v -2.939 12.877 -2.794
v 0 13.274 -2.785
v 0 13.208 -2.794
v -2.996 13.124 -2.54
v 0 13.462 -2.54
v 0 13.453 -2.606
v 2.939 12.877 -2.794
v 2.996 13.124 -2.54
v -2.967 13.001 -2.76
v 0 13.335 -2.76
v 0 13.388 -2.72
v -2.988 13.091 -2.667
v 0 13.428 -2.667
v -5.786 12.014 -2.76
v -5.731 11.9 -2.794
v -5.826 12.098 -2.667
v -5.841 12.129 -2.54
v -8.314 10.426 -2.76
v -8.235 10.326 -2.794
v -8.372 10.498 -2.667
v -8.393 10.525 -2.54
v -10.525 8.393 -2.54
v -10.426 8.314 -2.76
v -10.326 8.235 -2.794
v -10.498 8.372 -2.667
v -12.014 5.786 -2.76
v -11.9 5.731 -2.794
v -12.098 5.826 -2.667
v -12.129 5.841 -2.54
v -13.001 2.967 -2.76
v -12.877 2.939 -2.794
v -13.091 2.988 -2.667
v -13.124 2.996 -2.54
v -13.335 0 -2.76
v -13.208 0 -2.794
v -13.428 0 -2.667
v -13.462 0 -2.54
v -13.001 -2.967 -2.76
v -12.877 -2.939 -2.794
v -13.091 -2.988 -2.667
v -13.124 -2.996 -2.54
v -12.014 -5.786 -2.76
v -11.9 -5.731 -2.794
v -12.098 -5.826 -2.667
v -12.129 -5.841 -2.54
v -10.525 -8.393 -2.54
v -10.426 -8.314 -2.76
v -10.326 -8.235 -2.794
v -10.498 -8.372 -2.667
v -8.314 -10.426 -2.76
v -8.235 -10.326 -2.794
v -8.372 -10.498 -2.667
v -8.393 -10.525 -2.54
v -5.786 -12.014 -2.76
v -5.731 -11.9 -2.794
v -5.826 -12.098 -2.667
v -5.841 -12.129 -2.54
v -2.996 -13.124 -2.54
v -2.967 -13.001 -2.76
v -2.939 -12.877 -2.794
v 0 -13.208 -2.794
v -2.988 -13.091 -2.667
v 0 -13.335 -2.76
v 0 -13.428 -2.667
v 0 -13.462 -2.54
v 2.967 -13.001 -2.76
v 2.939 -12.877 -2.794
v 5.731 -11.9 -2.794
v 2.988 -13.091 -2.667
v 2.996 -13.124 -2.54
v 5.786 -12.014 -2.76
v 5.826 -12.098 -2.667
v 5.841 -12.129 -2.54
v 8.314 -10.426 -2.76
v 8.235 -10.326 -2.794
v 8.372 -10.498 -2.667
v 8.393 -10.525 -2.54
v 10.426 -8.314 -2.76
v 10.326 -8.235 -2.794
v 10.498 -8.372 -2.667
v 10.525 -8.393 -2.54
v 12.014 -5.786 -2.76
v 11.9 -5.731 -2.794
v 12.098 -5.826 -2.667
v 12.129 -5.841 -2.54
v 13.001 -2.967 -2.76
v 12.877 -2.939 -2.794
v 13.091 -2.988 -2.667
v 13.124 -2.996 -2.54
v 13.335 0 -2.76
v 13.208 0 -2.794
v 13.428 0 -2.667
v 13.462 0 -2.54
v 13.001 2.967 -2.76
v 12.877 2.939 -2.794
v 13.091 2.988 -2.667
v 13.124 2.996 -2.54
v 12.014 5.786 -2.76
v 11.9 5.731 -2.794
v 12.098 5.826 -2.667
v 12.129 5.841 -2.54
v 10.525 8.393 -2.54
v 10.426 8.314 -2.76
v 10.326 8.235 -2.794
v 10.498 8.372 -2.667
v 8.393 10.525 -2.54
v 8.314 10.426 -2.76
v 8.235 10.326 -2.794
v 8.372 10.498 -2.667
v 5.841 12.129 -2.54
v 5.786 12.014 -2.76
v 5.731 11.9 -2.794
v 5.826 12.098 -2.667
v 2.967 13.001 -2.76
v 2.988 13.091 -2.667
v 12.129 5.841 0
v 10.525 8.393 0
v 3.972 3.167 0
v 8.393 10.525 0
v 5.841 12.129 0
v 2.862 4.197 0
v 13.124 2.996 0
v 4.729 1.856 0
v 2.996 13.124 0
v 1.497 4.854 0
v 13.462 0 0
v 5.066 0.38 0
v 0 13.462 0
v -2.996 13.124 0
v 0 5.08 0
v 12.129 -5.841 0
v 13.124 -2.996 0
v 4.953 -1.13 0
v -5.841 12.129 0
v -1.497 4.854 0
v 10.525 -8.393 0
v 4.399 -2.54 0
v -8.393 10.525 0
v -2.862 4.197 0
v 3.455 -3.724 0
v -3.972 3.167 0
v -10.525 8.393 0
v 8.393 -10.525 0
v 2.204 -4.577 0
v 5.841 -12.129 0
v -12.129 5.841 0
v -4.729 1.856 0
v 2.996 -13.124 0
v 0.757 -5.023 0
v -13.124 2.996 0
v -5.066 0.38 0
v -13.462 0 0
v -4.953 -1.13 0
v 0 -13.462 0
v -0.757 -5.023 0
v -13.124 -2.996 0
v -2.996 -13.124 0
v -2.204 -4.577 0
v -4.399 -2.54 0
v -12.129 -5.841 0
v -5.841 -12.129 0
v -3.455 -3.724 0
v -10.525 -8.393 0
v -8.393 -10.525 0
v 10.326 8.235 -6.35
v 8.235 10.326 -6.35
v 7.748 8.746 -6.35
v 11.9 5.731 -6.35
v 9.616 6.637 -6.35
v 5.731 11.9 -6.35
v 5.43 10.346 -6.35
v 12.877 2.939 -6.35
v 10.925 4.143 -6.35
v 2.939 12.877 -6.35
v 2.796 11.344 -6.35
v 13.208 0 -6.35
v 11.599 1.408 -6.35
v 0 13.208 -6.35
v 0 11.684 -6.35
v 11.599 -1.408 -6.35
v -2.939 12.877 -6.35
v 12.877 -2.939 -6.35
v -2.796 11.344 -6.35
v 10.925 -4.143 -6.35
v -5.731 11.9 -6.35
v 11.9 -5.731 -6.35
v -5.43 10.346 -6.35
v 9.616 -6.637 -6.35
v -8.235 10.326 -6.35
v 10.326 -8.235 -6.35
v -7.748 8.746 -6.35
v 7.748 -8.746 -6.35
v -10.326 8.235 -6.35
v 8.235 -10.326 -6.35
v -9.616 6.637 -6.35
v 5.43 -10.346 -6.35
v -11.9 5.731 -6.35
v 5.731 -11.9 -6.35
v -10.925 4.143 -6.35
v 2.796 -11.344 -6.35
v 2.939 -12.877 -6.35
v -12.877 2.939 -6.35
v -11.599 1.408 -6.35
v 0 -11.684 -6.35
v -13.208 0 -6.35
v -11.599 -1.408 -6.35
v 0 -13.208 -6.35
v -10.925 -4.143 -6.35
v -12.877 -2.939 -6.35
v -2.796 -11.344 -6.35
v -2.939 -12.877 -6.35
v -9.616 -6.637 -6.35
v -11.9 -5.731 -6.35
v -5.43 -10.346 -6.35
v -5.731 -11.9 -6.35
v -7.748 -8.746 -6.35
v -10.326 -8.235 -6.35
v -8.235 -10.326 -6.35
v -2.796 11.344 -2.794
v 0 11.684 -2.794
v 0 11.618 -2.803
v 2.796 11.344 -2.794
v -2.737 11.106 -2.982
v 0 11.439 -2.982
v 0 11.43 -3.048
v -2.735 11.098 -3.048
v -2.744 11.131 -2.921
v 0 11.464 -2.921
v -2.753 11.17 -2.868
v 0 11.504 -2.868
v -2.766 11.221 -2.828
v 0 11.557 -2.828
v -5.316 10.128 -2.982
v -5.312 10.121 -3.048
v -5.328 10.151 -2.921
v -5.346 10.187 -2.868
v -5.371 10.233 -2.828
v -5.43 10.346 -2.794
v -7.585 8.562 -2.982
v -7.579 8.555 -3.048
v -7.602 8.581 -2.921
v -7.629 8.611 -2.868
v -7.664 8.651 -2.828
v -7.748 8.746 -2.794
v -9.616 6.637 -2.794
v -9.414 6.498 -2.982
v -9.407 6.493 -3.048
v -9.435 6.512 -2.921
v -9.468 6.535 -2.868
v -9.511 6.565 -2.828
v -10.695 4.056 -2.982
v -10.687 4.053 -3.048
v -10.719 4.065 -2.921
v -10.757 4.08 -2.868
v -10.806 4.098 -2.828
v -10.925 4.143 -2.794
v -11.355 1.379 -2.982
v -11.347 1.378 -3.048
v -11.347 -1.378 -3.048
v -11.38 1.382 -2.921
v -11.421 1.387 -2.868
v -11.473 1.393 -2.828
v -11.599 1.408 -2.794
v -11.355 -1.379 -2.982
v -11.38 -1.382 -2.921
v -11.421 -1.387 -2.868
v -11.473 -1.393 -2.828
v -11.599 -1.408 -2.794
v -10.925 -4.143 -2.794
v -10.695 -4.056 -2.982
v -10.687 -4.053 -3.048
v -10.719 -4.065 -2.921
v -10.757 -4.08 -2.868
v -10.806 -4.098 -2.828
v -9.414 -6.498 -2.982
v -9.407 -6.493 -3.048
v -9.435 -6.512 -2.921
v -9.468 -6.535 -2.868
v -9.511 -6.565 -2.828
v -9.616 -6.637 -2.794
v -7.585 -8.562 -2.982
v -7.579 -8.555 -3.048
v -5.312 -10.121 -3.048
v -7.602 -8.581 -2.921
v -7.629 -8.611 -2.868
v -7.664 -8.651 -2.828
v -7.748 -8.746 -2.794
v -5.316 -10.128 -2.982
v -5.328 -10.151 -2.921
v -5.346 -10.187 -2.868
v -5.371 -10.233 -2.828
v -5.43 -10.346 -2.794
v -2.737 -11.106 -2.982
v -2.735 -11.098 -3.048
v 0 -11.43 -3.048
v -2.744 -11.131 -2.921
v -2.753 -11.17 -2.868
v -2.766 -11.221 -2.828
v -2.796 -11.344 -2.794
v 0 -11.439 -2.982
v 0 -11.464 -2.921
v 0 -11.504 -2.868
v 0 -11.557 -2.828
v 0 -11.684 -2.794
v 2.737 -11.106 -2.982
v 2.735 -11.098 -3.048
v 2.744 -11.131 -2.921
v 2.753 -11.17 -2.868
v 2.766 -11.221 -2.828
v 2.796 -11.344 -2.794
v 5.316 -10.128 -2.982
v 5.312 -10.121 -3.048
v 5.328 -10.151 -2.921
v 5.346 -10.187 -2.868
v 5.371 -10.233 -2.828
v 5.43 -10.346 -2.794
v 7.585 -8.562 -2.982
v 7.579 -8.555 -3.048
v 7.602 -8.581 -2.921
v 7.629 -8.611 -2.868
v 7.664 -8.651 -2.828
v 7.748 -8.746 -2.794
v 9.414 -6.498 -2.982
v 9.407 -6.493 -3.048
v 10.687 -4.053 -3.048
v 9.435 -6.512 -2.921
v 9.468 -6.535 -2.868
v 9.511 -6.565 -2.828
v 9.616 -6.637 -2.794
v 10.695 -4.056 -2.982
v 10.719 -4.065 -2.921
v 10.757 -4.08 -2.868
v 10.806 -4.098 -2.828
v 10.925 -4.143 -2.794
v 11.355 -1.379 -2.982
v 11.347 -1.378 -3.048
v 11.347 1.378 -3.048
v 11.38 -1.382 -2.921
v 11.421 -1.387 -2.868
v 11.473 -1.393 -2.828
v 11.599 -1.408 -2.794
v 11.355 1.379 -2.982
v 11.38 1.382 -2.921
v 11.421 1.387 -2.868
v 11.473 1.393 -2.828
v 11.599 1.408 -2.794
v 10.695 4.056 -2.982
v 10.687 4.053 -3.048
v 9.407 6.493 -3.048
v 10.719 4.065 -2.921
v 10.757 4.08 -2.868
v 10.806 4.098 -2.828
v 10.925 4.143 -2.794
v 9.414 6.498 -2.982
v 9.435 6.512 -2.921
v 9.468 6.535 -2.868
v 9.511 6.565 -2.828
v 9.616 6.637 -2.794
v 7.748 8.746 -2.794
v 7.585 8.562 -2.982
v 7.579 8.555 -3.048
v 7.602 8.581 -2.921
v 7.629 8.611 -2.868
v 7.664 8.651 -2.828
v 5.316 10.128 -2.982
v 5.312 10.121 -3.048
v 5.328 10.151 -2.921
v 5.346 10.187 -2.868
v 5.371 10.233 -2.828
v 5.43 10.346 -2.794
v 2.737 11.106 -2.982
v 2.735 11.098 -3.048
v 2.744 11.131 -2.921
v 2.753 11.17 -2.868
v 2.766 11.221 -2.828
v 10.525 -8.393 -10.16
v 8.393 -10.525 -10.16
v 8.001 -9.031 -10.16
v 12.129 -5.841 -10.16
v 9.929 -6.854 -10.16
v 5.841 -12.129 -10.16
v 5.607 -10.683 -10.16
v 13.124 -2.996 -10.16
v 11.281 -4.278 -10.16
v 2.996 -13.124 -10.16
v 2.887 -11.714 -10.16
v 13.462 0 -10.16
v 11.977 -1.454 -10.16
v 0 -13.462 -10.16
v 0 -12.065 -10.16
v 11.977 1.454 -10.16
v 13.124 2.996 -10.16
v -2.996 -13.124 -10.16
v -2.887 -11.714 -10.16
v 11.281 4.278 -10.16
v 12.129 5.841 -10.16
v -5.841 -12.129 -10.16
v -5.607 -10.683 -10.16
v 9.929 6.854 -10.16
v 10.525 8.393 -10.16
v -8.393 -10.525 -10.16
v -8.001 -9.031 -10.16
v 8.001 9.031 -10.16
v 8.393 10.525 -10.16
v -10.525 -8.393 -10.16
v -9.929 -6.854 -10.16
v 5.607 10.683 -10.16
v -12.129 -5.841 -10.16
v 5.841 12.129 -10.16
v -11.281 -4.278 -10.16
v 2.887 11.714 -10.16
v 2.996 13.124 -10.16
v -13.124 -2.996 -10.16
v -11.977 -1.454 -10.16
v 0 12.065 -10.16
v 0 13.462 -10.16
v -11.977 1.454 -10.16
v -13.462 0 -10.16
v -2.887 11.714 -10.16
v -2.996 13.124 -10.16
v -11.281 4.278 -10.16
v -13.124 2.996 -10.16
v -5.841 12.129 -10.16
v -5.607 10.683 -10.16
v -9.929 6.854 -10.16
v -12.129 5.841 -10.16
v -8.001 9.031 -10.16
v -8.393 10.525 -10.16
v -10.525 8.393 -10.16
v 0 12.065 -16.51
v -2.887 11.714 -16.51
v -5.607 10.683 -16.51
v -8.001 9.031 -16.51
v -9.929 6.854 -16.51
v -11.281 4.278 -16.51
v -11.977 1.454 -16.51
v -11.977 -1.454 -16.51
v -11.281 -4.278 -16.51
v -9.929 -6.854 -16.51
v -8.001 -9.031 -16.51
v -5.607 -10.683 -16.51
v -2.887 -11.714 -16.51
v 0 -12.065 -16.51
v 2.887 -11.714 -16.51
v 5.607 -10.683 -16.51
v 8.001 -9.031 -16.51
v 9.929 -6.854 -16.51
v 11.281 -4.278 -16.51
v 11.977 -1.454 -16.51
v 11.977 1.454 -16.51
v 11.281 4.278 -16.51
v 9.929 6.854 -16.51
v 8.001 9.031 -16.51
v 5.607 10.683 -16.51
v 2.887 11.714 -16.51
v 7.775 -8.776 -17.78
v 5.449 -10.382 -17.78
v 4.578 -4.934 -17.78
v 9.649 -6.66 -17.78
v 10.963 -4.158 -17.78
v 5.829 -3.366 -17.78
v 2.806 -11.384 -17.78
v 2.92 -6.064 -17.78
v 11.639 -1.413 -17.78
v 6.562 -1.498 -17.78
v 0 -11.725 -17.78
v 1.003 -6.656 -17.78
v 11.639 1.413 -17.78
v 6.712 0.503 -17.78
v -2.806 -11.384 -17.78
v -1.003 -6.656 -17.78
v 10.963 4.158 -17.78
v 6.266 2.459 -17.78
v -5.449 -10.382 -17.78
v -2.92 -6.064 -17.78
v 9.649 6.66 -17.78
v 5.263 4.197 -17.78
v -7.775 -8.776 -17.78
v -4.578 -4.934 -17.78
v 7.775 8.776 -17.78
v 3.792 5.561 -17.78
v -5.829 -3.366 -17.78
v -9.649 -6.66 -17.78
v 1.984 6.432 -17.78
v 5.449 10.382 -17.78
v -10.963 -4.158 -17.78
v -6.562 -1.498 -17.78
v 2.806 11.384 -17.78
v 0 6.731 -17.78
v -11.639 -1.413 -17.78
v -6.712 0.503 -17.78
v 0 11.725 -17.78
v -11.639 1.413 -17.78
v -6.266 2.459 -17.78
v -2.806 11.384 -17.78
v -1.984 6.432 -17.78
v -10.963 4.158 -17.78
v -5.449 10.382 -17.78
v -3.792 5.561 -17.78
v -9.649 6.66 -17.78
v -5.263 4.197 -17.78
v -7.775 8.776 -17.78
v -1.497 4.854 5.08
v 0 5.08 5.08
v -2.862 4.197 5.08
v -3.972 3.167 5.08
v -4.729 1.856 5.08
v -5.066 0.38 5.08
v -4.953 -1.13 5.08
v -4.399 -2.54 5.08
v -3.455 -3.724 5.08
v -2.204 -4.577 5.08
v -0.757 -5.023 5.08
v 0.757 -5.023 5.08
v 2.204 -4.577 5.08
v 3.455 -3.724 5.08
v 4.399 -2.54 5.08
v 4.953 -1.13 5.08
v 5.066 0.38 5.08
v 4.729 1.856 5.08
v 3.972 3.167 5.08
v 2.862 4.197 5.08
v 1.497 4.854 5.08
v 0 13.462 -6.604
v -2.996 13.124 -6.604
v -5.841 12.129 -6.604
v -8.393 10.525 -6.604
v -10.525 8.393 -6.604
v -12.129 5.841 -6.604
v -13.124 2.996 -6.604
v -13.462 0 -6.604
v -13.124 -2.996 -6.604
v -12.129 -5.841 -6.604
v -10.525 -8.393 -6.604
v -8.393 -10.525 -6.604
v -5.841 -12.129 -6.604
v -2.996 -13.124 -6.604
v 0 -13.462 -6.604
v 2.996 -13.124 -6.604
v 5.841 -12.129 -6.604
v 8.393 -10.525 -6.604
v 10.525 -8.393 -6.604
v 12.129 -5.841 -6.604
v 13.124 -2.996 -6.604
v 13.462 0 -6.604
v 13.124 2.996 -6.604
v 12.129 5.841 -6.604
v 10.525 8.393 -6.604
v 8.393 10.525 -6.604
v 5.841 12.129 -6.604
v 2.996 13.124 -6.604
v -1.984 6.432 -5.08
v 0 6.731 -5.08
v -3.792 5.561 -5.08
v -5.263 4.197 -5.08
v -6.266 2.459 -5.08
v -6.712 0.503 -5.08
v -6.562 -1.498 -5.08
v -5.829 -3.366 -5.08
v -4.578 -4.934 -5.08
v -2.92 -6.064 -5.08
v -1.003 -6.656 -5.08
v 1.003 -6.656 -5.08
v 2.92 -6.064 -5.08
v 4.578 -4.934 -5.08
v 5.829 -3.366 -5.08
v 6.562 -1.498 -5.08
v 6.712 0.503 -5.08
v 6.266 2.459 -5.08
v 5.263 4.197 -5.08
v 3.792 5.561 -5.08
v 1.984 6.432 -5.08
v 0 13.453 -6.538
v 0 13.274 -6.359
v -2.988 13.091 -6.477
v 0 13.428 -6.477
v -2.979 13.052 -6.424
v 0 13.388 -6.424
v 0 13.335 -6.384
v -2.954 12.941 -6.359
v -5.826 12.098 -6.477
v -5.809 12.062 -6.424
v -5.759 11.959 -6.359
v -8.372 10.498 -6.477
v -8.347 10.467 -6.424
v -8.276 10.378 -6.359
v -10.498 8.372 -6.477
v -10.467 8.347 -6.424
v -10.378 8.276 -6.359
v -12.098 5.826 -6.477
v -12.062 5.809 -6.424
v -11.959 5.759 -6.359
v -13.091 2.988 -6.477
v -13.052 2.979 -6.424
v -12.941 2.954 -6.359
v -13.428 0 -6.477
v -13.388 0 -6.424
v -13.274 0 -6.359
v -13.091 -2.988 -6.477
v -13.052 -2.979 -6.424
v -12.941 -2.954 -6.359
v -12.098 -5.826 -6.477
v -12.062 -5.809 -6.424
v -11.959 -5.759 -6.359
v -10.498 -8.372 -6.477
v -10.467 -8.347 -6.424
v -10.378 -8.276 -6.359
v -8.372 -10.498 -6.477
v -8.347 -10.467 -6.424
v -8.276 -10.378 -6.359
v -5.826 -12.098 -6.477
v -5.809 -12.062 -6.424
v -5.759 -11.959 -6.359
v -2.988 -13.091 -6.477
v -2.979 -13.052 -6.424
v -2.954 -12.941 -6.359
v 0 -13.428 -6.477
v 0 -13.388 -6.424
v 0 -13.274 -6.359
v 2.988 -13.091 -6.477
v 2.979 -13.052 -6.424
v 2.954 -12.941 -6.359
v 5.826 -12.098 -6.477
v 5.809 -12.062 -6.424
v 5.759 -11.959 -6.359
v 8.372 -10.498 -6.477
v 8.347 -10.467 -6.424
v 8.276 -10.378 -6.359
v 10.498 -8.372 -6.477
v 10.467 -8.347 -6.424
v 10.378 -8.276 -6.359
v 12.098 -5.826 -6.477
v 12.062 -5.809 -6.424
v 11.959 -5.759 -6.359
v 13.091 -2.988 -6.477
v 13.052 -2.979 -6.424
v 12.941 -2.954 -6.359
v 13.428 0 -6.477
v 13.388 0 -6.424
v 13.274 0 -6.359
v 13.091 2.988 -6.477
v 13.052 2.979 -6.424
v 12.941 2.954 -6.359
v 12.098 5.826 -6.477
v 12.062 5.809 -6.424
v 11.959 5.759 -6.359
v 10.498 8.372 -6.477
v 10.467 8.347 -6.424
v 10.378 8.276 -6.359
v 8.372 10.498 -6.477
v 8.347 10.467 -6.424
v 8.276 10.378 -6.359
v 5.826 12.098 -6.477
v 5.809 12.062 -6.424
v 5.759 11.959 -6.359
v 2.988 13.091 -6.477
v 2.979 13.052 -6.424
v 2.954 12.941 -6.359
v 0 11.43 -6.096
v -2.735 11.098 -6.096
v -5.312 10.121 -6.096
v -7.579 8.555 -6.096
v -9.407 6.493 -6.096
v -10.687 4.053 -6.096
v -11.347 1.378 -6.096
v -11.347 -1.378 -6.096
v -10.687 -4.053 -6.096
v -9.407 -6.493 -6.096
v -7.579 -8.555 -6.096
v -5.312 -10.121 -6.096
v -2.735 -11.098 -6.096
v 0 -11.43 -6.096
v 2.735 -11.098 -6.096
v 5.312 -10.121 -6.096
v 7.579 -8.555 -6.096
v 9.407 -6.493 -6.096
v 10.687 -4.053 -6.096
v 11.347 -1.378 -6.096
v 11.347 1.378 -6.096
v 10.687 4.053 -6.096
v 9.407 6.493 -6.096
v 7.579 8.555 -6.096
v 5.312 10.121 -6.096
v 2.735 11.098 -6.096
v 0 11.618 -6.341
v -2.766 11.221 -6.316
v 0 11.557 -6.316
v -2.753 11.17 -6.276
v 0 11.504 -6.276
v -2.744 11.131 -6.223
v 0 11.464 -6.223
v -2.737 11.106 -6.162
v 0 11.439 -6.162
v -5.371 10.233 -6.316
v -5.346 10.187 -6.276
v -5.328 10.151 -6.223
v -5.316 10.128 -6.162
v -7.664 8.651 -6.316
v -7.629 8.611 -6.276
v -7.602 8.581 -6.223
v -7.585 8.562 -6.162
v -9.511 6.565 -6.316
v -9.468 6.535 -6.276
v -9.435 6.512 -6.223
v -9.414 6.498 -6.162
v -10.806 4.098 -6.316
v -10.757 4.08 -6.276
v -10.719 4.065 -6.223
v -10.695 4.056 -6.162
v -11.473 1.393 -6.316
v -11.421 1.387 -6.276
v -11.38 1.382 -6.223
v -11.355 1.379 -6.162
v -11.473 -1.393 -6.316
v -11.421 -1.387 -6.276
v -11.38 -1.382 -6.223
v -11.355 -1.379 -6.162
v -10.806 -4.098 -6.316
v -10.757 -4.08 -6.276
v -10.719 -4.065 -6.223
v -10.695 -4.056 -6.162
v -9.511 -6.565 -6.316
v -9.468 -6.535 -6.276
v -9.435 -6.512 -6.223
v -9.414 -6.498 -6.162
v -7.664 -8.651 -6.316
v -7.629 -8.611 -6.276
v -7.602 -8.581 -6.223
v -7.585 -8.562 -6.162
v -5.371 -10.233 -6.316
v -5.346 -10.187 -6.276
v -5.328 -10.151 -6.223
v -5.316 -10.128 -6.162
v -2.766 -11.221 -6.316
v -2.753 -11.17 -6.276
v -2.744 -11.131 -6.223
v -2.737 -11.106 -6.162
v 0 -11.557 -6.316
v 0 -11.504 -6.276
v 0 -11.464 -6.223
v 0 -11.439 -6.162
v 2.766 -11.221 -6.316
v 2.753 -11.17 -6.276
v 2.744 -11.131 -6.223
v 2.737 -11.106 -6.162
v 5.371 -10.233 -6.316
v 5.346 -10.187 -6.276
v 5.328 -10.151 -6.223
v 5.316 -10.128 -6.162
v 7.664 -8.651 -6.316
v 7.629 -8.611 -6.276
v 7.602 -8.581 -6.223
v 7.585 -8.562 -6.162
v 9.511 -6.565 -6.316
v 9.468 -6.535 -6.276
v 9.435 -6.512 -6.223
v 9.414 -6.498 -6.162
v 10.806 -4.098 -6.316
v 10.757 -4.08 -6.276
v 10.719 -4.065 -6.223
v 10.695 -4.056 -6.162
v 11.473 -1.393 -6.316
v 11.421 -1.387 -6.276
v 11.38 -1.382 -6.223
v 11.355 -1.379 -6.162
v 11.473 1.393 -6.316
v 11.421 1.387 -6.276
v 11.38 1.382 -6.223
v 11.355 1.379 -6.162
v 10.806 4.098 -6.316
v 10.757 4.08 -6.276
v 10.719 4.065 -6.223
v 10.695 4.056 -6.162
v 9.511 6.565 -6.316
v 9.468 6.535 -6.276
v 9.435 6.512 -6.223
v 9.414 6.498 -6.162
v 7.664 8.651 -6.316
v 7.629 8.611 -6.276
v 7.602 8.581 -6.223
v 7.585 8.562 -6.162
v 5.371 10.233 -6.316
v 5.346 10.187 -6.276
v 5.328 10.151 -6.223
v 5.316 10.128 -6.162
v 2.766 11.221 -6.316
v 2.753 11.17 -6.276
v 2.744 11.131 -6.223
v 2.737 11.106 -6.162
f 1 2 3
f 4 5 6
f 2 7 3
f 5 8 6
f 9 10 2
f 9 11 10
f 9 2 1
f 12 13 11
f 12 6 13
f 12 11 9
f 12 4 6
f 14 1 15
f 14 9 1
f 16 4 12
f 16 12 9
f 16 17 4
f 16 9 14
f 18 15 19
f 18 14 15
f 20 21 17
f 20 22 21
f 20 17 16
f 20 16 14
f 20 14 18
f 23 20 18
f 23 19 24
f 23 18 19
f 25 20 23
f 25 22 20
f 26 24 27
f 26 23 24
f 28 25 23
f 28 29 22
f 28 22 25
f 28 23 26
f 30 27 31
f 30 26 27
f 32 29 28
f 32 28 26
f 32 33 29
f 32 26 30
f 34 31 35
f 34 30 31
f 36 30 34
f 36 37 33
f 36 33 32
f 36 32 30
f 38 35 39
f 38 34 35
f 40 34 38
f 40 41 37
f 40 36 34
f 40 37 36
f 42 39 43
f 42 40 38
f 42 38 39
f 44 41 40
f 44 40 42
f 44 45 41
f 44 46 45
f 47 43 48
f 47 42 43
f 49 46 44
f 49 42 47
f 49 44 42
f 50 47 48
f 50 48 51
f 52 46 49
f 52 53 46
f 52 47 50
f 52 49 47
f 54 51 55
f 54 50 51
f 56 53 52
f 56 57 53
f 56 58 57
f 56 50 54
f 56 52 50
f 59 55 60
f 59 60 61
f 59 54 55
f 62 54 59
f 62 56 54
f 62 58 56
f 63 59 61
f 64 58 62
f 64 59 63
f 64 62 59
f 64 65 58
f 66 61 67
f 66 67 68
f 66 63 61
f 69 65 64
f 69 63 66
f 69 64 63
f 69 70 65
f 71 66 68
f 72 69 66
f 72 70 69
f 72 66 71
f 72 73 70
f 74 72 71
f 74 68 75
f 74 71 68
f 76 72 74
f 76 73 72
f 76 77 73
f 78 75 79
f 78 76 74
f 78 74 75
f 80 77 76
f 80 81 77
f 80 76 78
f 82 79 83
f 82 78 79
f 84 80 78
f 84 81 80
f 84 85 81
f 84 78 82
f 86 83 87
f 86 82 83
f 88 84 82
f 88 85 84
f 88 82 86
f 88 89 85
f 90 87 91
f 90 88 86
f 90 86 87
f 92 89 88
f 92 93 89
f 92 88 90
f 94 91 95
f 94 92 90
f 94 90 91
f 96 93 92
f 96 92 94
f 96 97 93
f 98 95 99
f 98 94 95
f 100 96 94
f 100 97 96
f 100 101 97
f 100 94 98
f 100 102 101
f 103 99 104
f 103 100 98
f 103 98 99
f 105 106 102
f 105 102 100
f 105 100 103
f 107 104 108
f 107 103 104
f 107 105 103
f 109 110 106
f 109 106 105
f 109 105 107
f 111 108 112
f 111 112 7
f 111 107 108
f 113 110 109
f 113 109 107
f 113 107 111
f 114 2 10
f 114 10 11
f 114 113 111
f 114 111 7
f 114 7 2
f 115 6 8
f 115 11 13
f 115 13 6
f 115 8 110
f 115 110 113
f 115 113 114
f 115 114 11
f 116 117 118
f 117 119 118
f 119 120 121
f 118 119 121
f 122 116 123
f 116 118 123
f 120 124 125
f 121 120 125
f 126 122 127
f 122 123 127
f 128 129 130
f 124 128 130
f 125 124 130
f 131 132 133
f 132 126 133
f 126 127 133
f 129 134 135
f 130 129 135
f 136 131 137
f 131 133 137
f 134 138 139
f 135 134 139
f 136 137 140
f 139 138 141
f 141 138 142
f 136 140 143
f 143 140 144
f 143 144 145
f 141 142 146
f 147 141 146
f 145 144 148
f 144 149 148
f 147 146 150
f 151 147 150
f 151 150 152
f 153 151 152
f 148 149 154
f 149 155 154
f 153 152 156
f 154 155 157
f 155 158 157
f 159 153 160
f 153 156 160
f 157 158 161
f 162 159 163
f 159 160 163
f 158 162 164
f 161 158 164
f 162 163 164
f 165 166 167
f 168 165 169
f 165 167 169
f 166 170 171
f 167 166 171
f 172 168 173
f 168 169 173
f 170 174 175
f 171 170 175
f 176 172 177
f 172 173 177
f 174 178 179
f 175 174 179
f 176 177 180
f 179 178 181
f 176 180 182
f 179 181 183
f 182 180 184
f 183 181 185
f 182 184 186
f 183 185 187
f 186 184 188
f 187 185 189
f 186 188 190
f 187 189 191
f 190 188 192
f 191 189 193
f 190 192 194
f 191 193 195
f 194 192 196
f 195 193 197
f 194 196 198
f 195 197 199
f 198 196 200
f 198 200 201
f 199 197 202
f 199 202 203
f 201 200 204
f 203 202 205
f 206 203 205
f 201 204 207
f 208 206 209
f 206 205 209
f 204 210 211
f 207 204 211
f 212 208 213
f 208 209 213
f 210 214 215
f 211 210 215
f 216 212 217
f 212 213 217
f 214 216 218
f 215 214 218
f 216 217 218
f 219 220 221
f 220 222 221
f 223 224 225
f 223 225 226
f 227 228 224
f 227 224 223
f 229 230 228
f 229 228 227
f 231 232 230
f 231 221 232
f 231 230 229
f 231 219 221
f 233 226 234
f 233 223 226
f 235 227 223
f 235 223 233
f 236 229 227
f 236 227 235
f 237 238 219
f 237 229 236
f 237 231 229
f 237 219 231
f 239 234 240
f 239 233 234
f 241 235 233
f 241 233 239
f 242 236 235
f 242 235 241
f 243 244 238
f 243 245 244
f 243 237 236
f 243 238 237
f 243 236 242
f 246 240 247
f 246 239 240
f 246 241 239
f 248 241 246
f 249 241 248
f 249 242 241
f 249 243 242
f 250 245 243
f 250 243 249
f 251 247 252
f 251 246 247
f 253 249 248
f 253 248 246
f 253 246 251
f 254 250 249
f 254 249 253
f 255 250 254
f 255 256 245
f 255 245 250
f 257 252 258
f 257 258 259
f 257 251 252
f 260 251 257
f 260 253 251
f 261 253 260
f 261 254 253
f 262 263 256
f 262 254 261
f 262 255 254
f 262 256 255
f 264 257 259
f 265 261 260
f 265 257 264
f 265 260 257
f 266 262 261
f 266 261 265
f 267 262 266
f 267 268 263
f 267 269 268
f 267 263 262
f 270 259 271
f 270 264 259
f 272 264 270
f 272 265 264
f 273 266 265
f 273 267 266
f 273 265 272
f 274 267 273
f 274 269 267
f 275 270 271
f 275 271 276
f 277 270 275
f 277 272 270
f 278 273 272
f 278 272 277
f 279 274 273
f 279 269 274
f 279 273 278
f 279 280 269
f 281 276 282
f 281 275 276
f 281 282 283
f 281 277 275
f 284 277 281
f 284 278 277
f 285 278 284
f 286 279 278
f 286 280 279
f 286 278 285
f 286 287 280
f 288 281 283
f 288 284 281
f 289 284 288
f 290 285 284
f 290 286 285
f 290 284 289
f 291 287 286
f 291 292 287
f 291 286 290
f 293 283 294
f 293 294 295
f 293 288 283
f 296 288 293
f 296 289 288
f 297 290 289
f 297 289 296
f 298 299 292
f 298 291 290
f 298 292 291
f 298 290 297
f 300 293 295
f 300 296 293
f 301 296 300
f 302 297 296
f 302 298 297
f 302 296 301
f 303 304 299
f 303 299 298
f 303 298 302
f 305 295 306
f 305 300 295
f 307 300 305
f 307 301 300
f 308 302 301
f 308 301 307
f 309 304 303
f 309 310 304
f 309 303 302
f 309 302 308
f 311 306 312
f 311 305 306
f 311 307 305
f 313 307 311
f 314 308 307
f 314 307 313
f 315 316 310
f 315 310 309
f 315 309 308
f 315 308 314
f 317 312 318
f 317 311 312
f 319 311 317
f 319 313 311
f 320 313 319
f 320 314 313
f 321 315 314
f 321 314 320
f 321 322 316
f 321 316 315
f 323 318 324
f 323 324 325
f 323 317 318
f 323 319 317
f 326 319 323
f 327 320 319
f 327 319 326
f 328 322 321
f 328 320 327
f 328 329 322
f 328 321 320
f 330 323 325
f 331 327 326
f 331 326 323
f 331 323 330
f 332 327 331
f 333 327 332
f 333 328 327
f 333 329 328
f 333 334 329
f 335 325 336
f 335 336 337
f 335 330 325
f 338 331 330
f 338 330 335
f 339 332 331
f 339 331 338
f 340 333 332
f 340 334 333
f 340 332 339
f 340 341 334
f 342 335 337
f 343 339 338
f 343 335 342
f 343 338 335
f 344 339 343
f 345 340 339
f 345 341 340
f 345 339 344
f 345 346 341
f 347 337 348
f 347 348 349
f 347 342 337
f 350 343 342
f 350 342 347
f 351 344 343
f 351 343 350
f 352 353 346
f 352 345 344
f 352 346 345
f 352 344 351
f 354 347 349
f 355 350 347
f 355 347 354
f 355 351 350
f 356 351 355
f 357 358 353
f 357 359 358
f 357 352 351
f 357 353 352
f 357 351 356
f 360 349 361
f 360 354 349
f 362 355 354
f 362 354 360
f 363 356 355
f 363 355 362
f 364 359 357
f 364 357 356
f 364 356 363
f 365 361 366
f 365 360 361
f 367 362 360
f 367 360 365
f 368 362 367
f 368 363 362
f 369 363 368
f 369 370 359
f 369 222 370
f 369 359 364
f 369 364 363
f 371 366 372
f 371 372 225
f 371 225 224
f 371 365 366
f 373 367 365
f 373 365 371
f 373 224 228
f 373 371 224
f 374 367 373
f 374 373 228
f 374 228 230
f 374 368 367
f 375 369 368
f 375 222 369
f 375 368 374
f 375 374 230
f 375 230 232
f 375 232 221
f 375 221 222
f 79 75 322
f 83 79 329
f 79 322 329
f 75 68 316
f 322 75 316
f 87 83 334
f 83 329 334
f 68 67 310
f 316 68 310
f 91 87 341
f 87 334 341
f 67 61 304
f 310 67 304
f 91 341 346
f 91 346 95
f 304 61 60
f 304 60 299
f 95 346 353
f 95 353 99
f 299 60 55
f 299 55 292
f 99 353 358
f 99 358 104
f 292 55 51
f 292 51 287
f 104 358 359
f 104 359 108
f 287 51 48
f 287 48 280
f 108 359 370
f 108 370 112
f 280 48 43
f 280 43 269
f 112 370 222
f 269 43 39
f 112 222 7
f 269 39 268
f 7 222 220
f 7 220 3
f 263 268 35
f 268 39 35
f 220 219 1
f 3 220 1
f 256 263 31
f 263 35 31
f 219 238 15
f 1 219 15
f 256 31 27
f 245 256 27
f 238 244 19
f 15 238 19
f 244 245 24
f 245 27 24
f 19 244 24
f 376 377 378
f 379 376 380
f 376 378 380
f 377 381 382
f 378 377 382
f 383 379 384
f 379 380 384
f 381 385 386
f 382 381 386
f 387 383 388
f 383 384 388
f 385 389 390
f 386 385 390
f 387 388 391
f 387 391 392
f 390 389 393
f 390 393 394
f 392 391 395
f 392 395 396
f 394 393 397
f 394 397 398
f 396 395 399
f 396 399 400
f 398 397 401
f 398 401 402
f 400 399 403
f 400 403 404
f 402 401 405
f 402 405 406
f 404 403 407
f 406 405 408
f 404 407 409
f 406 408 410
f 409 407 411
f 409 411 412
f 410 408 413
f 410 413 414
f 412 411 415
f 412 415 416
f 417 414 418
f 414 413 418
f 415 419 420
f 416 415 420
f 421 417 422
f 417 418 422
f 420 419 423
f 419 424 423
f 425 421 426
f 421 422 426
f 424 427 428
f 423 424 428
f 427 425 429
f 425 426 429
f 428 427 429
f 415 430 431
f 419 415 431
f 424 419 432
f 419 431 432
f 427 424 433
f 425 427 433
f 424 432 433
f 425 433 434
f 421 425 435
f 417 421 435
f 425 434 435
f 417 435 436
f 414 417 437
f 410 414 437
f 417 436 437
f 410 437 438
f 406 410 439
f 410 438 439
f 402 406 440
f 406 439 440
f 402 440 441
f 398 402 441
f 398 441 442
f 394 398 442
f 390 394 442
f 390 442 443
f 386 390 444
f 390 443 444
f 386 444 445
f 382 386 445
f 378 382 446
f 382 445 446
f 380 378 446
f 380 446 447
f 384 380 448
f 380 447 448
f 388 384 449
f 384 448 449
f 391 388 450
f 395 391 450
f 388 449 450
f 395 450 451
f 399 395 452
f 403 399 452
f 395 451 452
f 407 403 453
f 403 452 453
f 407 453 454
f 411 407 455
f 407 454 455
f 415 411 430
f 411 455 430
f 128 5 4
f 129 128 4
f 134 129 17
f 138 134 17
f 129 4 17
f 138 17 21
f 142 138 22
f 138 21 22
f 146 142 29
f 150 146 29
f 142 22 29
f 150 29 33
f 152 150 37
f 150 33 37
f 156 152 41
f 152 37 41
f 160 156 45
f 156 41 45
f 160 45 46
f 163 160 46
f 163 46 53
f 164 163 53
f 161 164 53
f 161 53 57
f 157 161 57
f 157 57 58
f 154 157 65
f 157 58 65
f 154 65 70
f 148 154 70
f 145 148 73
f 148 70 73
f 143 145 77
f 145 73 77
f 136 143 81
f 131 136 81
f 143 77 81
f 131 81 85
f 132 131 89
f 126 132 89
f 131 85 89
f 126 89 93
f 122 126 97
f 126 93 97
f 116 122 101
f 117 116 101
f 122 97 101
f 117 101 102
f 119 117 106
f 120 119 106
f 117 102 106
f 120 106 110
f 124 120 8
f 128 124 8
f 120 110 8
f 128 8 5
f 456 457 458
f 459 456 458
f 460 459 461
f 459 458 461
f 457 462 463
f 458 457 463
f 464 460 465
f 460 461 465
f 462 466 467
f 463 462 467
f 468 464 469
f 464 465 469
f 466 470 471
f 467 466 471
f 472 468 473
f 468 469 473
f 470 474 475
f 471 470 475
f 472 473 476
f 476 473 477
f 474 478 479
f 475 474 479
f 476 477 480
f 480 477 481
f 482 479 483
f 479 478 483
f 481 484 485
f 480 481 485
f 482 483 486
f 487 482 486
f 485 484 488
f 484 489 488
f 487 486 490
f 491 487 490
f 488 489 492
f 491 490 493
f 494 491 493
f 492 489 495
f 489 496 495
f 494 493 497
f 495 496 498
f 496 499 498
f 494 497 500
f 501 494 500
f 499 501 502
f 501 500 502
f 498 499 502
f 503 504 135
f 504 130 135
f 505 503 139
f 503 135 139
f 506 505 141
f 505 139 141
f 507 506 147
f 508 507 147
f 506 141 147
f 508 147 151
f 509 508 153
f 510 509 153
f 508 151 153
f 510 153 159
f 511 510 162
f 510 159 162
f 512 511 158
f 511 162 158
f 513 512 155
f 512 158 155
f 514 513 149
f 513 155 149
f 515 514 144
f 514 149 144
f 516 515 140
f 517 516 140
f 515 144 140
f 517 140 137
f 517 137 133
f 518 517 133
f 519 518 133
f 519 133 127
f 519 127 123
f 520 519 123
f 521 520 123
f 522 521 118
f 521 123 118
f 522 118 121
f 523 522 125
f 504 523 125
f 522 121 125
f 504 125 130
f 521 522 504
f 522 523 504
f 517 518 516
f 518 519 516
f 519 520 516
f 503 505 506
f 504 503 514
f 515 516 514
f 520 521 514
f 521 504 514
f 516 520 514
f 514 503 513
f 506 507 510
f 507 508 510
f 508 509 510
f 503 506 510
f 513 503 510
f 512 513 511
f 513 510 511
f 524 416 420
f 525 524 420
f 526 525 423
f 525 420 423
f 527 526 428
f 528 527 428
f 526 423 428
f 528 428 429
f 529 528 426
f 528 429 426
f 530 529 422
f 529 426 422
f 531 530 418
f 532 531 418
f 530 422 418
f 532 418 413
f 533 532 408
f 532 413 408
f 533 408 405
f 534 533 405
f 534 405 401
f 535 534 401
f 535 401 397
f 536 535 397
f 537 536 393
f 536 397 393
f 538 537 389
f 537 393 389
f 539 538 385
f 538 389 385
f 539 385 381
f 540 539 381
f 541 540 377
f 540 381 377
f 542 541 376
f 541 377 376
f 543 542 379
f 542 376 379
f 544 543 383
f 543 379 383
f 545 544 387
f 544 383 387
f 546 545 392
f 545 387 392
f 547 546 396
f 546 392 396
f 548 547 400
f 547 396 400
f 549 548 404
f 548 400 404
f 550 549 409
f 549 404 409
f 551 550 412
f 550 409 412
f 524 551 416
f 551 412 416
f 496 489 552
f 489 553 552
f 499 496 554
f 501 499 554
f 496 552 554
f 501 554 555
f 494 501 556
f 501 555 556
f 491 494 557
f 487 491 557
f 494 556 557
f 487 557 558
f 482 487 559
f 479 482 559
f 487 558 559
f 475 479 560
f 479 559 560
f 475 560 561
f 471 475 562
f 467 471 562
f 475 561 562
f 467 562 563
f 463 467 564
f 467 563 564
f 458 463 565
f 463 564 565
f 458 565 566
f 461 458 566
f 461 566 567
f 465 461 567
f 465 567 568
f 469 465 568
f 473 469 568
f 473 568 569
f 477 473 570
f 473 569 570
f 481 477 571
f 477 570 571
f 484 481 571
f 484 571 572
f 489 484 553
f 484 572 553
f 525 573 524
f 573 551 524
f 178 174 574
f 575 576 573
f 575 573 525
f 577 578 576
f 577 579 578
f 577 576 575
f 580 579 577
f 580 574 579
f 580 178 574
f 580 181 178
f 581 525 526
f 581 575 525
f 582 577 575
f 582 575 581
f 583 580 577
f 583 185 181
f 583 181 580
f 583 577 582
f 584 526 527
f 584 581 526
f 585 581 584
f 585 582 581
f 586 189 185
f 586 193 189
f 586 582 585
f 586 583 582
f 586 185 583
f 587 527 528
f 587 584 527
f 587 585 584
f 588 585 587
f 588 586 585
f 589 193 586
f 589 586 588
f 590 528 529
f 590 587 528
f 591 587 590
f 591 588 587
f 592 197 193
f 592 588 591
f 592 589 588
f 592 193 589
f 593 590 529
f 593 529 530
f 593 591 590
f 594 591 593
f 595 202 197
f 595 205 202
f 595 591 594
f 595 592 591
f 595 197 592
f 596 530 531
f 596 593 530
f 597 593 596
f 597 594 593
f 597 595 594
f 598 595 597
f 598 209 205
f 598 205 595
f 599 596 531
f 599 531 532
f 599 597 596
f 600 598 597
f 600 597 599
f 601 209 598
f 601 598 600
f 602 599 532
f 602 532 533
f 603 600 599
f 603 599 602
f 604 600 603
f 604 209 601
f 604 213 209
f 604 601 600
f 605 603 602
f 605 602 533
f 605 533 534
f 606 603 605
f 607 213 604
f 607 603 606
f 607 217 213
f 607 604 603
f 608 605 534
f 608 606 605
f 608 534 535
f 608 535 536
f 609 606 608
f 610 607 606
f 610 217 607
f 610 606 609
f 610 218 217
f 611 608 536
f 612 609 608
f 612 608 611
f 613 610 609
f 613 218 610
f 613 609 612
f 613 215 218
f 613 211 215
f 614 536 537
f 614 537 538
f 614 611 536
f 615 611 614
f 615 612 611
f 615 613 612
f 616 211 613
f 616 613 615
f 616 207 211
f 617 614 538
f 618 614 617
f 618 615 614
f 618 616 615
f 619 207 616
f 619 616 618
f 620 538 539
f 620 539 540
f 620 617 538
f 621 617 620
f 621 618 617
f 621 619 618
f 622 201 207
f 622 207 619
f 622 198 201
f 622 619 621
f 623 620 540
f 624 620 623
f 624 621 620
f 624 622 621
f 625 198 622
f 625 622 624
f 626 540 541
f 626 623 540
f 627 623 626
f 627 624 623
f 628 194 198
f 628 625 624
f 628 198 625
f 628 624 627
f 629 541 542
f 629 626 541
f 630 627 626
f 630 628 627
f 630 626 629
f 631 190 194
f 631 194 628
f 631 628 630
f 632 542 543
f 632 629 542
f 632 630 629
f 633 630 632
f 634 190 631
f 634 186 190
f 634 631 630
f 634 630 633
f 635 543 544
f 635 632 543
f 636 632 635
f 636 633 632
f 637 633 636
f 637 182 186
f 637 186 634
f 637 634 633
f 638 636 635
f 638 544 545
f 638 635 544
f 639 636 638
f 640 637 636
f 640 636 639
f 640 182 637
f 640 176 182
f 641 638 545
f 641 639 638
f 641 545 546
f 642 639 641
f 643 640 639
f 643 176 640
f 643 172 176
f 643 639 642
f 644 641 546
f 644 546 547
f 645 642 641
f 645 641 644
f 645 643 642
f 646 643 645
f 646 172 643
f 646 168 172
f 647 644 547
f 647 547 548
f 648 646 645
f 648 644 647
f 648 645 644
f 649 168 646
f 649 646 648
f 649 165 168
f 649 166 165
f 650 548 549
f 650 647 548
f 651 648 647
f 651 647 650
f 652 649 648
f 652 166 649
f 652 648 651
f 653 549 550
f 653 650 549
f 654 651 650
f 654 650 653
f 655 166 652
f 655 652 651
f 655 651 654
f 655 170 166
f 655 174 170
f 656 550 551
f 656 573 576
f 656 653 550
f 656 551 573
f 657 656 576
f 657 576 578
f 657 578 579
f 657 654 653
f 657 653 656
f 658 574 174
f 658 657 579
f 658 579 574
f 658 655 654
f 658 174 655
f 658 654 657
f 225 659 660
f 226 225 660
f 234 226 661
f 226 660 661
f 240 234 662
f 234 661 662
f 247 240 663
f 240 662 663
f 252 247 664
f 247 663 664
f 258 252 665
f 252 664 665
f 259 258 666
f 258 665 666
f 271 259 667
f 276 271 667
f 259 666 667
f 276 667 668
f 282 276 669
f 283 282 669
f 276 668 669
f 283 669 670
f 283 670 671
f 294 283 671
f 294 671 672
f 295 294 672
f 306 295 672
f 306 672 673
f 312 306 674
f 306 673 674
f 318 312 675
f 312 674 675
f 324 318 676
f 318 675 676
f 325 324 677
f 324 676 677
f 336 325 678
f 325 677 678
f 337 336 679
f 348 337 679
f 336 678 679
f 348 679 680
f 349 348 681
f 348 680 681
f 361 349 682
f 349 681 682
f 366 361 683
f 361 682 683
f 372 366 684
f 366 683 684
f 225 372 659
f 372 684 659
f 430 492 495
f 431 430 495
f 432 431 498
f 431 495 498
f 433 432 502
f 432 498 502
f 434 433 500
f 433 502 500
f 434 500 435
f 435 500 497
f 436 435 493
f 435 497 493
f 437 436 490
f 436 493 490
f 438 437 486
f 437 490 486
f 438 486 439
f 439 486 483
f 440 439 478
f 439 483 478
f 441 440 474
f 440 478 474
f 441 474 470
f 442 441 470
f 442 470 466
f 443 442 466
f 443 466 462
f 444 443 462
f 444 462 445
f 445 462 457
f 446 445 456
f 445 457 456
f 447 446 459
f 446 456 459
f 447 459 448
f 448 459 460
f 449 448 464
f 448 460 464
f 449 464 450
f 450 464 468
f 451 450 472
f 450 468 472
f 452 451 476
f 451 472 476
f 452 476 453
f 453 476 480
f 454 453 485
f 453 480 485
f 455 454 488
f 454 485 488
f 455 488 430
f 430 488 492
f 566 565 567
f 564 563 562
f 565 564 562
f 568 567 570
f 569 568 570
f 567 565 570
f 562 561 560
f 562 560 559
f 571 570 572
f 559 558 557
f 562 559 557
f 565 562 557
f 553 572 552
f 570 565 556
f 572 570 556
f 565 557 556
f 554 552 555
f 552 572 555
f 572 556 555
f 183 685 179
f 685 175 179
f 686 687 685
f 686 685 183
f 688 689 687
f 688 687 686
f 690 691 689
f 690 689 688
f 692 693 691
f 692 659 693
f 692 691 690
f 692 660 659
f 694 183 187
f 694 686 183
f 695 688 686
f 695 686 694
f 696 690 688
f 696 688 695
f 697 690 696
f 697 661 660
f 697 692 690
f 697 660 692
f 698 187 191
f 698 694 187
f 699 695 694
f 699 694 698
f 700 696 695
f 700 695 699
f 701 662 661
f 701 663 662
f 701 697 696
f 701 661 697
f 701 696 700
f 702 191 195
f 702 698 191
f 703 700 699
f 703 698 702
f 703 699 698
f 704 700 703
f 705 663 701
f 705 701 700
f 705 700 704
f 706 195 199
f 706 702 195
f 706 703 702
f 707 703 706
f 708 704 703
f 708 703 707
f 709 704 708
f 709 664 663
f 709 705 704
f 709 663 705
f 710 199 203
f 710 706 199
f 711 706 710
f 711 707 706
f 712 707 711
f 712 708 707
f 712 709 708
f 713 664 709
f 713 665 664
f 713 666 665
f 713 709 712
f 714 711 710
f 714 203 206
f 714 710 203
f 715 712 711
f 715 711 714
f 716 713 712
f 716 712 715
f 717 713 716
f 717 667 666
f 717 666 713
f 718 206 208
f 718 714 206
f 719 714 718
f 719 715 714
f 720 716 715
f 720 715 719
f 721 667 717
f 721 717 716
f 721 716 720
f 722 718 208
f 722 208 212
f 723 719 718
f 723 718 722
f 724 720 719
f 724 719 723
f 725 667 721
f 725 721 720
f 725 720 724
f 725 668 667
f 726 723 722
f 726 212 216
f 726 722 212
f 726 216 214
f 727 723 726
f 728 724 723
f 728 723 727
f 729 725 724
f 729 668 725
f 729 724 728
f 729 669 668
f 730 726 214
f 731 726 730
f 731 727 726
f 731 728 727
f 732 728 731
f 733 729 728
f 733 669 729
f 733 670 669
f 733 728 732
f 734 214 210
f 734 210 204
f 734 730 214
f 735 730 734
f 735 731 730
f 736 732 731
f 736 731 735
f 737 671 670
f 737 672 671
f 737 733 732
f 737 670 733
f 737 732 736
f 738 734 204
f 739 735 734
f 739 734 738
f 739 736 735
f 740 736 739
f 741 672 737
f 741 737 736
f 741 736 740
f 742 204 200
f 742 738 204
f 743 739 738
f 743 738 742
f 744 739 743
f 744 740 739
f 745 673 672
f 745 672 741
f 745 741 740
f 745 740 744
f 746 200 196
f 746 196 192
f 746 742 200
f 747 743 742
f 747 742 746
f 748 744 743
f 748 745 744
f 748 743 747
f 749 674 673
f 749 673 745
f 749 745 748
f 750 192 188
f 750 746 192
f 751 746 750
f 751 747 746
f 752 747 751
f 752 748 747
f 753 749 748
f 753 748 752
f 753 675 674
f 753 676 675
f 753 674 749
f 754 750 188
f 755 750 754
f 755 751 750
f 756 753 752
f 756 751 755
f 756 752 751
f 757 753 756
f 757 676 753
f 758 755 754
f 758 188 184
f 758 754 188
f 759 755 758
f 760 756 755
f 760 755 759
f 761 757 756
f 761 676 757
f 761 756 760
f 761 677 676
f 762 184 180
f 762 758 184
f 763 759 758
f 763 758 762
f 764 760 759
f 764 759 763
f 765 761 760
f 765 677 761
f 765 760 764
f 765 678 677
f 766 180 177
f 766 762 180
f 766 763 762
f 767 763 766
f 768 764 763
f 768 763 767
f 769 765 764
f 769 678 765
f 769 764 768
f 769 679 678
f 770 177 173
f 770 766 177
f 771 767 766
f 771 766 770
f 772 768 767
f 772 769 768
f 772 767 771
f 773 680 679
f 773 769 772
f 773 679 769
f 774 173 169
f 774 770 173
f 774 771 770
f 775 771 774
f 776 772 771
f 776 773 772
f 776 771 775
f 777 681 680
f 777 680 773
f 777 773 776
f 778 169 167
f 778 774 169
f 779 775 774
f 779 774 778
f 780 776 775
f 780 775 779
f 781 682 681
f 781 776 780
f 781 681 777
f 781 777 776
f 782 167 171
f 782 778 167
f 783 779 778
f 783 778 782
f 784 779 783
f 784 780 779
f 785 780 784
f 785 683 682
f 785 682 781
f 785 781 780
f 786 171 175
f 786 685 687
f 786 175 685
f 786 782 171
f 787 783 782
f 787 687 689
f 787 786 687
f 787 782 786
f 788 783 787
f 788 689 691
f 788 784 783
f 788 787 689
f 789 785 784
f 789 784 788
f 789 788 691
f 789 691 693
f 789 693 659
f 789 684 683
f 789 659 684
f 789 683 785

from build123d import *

# Parameters (mm, degrees)
CHAMFER1_SIZE  = 1.27
CHAMFER1_SIZE2 = 0.340295474
FILLET1_R      = 0.254


with BuildPart() as part:
    # Sketch1 → Revolve1 (revolve)
    with BuildSketch(Plane(origin=(0, 0, 0), x_dir=(0, 0, -1), z_dir=(1, 0, 0))):
        Polygon((0, 5.08), (0, 13.462), (2.794, 13.462), (2.794, 11.43), (6.35, 11.43), (6.35, 13.462), (10.16, 13.462), (10.16, 12.065), (17.78, 12.065), (17.78, 6.731), (5.08, 6.731), (5.08, 0), (0, 0), (-5.08, 0), (-5.08, 5.08), align=None)
    revolve(axis=Axis((0, 0, -5.08), (0, 0, 1)))

    # Chamfer1
    chamfer1_edges = [part.edges().sort_by_distance(p)[0] for p in [
        (0, -12.065, -17.78),
    ]]
    chamfer1_side = [part.faces().sort_by_distance(p)[0] for p in [
        (0, -12.065, -13.97),
    ]]
    chamfer(chamfer1_edges, length=CHAMFER1_SIZE, length2=CHAMFER1_SIZE2, reference=chamfer1_side[0])

    # Fillet1
    fillet1_edges = [part.edges().sort_by_distance(p)[0] for p in [
        (0, -13.462, -6.35),
        (0, -11.43, -6.35),
        (0, -11.43, -2.794),
        (0, -13.462, -2.794),
    ]]
    fillet(fillet1_edges, radius=FILLET1_R)


solid = part.part
